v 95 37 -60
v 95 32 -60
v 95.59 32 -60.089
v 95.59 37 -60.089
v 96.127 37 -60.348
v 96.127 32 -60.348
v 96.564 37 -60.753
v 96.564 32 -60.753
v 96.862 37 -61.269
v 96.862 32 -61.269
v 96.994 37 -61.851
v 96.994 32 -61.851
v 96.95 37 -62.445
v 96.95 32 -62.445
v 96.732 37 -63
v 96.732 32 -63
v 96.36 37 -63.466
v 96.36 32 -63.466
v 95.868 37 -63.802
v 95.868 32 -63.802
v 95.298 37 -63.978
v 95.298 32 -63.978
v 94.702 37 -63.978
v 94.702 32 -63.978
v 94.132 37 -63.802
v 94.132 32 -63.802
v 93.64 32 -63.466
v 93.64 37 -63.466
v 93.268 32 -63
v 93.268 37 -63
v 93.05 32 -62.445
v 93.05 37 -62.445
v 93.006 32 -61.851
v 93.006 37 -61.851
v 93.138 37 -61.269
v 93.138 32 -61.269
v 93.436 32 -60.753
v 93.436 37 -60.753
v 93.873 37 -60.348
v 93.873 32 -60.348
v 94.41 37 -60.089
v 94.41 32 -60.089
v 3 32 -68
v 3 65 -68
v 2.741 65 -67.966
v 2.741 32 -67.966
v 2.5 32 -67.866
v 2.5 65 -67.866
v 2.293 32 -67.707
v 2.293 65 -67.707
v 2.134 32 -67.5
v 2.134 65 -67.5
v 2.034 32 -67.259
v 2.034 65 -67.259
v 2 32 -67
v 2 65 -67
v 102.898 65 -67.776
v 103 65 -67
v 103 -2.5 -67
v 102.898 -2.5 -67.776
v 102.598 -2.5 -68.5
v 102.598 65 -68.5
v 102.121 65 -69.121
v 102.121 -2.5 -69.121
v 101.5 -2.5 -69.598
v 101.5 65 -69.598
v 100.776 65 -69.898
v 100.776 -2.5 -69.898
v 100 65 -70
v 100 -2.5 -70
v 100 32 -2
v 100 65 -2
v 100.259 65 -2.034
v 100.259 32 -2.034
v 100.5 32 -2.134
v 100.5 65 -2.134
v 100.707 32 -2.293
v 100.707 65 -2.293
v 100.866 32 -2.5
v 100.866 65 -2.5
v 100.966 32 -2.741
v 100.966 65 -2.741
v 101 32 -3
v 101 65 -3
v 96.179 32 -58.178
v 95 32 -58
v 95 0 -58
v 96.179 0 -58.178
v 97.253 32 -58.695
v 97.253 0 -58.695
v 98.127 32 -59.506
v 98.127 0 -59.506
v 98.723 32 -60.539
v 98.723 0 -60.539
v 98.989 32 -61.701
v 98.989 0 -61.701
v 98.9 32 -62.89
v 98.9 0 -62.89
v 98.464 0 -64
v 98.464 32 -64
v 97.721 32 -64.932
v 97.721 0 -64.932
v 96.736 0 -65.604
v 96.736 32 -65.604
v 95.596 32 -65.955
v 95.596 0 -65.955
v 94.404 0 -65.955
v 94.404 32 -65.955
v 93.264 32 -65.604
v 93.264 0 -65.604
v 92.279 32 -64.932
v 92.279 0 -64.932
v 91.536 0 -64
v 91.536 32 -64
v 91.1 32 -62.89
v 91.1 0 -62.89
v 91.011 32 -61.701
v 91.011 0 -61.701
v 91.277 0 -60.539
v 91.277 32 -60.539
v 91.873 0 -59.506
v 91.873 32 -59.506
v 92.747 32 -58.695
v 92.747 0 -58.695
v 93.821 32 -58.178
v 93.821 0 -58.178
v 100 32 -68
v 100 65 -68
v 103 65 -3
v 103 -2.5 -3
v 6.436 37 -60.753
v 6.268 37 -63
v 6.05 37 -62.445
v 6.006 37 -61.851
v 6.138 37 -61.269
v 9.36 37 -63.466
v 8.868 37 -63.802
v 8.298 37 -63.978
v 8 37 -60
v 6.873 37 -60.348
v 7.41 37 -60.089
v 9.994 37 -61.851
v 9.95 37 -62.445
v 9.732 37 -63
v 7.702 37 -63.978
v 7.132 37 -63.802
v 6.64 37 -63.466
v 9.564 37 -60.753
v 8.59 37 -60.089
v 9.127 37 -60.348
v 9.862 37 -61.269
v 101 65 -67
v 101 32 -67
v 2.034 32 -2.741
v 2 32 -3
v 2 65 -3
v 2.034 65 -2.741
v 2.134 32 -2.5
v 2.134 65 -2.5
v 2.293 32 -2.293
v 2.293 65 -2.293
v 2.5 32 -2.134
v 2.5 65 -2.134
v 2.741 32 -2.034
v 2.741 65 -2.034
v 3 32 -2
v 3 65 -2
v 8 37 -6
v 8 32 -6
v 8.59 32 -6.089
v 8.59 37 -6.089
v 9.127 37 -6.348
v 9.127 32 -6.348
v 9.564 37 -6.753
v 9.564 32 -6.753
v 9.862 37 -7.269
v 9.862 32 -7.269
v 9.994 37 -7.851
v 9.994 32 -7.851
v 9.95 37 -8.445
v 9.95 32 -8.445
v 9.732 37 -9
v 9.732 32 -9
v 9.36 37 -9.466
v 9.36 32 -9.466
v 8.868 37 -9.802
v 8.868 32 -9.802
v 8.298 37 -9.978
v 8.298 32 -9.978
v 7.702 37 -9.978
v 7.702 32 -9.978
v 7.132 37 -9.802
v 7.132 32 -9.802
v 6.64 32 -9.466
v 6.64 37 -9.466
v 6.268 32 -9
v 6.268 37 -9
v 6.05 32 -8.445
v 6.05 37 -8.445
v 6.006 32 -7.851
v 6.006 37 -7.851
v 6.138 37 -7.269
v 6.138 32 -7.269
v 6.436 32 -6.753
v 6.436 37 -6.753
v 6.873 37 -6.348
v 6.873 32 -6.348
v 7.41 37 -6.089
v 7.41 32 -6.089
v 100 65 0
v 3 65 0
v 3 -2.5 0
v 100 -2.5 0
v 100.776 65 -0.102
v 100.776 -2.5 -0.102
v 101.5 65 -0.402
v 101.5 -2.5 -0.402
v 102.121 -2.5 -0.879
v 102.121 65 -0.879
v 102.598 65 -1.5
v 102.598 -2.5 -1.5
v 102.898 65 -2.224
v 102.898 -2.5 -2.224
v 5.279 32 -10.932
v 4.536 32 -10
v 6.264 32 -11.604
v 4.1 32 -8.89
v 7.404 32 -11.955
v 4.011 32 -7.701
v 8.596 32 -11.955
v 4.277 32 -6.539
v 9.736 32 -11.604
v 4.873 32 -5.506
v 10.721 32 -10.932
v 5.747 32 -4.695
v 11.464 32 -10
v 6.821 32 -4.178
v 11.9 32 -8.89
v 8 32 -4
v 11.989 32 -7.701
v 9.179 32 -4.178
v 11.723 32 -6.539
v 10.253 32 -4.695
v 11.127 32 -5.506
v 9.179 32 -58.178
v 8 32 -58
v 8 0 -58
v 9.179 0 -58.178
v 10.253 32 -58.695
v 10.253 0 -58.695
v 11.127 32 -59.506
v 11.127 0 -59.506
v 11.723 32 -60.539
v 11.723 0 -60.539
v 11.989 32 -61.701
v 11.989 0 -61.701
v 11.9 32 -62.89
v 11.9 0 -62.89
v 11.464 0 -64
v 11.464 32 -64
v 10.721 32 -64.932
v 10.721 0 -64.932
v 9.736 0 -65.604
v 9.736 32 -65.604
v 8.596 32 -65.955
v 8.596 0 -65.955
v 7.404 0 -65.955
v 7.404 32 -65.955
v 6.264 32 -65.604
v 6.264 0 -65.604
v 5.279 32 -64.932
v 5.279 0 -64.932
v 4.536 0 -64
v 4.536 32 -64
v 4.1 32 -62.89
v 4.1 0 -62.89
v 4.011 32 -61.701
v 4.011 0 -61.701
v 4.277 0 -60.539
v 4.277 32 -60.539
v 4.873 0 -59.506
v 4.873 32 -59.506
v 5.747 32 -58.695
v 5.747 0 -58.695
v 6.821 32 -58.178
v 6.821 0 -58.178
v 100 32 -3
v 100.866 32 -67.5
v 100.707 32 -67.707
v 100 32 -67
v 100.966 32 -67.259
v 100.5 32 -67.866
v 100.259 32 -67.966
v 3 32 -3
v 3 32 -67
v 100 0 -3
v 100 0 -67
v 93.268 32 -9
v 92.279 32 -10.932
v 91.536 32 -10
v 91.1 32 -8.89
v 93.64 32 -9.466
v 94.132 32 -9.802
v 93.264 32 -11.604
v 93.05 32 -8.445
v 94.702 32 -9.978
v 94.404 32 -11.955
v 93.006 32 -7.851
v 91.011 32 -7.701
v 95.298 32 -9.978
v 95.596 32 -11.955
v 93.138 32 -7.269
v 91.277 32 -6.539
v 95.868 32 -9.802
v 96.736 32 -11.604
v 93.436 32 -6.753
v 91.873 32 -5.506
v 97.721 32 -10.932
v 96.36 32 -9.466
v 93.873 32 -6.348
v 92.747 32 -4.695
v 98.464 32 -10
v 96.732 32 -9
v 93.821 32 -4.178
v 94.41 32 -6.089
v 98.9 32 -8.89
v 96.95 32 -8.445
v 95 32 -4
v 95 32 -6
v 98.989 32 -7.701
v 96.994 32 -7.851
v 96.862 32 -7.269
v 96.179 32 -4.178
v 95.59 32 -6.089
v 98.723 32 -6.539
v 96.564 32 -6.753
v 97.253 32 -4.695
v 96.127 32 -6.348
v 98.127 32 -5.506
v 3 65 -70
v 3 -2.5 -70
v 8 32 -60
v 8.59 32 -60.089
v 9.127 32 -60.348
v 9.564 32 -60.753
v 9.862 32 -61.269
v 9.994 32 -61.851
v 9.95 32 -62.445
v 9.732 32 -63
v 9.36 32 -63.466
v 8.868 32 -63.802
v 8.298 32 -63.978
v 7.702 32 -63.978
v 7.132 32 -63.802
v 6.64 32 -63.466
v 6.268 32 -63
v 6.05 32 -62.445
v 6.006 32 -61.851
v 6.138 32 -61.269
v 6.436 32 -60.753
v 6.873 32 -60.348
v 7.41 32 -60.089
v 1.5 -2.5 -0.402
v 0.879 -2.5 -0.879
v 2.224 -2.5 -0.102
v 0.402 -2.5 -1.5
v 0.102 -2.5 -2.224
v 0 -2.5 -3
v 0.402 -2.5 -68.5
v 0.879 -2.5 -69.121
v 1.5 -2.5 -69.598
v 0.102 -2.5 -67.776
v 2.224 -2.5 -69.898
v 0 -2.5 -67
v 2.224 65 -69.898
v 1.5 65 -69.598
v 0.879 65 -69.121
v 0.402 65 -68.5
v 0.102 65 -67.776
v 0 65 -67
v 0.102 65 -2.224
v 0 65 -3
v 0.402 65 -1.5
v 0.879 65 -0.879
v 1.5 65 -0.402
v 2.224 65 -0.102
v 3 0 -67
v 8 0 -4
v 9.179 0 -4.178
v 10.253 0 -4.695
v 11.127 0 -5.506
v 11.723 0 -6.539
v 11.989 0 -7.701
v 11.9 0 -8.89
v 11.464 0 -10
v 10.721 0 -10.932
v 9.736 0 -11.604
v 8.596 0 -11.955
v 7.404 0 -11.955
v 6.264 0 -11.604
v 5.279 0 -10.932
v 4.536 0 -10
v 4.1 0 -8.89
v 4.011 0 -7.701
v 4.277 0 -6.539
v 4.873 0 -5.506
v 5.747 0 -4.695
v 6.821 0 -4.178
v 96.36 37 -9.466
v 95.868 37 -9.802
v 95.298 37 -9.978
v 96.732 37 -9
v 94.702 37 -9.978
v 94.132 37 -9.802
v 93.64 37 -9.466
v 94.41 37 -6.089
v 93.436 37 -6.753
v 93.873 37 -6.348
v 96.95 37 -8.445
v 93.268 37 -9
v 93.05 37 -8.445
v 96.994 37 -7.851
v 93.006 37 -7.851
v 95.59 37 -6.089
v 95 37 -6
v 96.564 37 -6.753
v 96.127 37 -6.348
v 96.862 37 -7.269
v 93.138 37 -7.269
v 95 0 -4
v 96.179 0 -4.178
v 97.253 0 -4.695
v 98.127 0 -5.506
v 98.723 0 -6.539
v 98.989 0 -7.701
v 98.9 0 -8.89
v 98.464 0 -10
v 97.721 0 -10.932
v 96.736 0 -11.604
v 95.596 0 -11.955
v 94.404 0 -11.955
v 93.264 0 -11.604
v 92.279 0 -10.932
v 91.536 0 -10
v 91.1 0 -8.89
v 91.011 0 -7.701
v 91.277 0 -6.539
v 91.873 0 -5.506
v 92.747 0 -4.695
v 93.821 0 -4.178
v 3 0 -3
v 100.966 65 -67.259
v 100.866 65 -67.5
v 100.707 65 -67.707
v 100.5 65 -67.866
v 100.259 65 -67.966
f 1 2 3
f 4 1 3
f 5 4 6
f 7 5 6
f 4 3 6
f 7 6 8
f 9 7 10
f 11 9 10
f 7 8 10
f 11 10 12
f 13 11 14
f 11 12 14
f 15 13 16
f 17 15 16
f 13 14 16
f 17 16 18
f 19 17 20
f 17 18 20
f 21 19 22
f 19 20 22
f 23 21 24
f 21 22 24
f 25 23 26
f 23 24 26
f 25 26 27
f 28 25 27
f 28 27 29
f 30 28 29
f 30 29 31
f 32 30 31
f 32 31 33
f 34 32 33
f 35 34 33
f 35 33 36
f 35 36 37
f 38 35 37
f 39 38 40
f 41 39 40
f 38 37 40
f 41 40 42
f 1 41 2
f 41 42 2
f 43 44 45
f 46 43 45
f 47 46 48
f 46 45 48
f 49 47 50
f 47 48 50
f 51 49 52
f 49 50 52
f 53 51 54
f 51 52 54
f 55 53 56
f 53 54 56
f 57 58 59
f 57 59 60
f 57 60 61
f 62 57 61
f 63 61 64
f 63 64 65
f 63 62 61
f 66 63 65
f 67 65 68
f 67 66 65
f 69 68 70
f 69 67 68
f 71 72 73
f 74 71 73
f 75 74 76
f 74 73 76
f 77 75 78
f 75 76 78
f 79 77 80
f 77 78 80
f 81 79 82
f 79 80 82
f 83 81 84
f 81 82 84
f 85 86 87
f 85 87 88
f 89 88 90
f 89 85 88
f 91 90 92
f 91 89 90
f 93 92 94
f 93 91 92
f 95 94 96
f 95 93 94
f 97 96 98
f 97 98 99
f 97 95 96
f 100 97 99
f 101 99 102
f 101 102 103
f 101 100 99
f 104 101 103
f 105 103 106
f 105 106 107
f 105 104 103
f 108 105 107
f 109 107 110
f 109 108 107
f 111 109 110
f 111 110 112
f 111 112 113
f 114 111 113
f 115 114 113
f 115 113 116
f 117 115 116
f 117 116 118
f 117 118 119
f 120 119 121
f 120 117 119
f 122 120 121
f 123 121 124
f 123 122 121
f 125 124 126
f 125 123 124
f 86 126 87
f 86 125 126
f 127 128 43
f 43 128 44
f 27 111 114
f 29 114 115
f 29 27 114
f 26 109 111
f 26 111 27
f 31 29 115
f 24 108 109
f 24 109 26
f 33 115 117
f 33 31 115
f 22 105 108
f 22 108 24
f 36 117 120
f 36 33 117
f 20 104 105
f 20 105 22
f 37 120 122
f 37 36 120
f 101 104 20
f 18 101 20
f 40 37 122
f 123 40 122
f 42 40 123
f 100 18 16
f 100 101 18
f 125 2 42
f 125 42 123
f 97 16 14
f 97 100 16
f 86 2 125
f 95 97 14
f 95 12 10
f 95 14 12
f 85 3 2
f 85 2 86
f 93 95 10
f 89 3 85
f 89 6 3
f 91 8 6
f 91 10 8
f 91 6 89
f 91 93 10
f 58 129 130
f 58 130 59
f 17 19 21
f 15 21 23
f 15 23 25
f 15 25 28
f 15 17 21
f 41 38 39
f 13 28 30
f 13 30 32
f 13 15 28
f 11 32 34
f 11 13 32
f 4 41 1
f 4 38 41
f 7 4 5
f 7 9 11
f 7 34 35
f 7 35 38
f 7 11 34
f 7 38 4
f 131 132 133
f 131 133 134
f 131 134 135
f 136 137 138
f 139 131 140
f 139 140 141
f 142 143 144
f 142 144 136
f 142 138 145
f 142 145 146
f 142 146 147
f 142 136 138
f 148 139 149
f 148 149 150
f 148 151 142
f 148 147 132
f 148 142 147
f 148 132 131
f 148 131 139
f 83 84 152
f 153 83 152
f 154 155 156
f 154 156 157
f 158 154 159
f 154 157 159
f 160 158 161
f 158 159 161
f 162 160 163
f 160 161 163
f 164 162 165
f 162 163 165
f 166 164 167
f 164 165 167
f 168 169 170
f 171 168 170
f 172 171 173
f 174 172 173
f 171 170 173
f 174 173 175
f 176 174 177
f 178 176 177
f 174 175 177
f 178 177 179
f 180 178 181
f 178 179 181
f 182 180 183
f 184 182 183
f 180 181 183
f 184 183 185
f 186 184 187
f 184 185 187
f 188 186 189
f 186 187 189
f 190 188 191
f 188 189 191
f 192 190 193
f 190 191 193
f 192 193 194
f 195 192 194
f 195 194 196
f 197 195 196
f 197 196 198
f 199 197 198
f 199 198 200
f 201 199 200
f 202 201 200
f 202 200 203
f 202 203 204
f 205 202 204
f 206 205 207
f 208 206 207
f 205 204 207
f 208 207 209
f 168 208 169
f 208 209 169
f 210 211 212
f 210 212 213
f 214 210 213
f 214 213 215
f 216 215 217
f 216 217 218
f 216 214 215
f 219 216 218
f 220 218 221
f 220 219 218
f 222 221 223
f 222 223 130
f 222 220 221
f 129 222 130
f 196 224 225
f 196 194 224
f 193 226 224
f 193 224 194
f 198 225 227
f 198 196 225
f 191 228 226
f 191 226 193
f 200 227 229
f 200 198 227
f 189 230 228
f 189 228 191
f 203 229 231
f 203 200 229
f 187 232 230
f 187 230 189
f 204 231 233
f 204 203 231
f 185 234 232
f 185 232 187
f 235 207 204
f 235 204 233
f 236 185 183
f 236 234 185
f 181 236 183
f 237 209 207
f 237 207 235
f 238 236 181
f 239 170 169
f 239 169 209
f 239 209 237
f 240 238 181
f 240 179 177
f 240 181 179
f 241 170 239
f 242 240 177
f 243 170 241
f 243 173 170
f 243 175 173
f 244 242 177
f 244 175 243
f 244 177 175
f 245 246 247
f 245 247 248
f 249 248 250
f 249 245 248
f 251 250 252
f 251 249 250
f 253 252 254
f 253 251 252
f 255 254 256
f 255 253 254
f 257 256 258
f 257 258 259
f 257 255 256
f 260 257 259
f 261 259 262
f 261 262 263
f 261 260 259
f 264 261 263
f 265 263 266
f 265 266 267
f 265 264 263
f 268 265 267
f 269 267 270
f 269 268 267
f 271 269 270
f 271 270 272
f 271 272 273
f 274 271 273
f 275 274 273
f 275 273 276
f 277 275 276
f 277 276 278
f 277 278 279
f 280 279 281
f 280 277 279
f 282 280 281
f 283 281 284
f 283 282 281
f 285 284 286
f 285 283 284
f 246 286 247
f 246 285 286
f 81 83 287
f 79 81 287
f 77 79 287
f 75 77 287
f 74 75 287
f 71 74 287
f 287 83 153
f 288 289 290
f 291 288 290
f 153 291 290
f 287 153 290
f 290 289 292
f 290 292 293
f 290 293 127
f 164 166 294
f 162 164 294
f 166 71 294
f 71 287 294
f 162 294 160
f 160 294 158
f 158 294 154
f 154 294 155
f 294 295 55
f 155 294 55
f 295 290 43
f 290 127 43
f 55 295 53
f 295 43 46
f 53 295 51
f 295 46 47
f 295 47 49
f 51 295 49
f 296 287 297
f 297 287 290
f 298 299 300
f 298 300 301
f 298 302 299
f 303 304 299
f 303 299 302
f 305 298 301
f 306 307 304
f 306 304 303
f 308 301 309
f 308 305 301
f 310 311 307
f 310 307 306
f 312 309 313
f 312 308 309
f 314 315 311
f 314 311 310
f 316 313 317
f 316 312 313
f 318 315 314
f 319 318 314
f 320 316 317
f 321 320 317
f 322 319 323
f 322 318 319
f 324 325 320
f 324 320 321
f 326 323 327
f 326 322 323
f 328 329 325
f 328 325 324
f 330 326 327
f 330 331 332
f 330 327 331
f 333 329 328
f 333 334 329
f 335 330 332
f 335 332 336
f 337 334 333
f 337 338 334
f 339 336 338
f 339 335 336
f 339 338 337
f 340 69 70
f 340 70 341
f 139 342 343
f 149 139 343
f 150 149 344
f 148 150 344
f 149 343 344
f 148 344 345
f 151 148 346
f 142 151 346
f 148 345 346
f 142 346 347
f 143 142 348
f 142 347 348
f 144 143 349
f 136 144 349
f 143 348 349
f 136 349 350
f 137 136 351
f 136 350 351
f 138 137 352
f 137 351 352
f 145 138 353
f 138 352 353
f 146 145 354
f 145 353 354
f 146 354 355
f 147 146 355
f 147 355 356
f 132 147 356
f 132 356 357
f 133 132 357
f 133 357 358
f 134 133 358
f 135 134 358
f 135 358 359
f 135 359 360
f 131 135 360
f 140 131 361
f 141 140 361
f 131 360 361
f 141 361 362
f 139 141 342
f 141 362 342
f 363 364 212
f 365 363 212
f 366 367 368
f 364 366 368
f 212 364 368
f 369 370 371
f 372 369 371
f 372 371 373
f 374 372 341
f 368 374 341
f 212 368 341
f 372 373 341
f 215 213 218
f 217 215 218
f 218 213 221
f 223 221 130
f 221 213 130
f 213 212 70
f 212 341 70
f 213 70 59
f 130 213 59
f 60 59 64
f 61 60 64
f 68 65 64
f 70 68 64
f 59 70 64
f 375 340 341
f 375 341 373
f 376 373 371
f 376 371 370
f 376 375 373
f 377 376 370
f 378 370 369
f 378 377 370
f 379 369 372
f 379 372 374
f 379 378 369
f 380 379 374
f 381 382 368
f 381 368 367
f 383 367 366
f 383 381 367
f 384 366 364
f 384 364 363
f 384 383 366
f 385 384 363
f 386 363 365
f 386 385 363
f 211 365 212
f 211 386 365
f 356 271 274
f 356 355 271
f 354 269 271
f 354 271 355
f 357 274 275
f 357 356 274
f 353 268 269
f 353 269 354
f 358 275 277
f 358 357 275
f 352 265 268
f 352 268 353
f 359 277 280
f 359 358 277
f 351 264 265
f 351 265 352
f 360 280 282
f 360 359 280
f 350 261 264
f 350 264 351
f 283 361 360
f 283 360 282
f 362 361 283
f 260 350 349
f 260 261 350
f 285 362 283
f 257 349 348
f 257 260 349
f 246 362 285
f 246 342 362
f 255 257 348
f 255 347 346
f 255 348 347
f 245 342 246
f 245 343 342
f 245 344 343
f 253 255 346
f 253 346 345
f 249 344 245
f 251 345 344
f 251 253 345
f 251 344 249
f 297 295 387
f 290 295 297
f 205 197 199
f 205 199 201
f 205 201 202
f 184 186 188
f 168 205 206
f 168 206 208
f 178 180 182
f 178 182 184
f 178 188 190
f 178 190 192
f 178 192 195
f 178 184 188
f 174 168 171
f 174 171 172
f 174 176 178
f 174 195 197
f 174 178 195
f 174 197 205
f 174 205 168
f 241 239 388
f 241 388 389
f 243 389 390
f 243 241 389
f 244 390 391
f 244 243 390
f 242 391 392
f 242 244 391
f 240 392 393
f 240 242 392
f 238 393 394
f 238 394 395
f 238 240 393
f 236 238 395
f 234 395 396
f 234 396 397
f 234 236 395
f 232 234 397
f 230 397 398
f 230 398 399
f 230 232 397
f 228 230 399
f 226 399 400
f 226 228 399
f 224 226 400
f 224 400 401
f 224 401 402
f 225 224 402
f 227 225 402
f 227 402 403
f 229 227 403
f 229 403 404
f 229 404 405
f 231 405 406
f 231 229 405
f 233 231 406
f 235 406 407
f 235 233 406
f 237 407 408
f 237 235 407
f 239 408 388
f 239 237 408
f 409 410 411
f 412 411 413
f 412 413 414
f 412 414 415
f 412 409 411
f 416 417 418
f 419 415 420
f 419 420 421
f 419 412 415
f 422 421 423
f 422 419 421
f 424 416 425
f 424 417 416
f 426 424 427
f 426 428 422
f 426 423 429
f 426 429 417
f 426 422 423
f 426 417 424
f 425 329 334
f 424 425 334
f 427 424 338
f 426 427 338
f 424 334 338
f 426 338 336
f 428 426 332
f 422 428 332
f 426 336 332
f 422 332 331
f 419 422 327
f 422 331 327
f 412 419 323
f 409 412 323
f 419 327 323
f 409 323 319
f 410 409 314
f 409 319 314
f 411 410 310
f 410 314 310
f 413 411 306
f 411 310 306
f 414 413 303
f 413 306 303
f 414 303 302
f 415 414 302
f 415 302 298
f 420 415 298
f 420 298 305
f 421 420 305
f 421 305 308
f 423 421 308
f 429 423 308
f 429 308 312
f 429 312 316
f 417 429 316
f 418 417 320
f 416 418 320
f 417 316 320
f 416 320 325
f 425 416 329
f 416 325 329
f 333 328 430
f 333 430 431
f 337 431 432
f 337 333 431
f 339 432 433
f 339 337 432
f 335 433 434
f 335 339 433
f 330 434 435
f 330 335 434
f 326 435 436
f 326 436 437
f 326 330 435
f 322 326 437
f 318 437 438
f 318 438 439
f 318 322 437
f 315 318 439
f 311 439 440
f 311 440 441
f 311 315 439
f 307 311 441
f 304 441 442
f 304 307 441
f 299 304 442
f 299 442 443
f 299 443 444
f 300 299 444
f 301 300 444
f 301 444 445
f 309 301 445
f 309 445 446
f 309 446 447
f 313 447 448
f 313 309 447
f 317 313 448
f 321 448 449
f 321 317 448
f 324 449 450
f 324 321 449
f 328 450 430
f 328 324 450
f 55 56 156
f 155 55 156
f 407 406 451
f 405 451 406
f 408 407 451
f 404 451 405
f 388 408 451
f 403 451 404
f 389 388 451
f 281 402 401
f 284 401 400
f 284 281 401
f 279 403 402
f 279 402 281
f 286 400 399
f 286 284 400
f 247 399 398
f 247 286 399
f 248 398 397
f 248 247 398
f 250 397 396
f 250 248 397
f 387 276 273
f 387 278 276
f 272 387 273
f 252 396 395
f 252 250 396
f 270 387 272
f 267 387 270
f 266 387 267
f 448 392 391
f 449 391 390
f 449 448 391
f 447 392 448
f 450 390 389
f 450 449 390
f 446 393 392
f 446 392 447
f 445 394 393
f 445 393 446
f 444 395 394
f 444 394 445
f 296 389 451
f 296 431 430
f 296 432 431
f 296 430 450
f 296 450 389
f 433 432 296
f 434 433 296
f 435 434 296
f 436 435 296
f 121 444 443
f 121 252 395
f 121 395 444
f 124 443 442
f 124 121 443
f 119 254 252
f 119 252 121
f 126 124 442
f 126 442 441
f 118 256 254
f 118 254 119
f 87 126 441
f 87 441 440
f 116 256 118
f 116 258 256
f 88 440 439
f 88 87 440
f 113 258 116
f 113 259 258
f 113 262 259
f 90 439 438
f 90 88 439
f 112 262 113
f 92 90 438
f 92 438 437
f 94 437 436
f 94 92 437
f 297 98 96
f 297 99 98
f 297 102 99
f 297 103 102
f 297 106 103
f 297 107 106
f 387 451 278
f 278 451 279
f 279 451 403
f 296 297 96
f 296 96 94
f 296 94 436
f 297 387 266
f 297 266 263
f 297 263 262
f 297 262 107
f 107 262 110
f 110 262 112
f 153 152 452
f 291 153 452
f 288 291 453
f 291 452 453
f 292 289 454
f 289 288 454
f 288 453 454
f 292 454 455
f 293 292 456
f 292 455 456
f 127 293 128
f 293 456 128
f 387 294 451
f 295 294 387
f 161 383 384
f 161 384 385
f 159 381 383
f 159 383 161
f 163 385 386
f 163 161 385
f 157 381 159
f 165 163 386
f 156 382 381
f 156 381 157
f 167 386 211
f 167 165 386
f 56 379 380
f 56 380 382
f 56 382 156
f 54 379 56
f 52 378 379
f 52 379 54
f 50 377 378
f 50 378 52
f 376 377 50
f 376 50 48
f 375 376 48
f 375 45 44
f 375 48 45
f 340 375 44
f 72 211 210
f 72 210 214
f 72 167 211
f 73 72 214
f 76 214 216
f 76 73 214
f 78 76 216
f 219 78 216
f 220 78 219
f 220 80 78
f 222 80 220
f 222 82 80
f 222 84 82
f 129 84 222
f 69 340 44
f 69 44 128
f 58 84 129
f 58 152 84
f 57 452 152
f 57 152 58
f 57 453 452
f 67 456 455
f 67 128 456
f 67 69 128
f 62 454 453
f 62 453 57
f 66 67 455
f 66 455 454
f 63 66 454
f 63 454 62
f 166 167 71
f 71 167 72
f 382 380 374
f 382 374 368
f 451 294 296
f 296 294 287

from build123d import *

# Parameters (mm, degrees)
BOSS_EXTRUDE4_DEPTH  = 2.5
BOSS_EXTRUDE5_START  = 65
BOSS_EXTRUDE5_DEPTH  = 65
BOSS_EXTRUDE6_START  = 32
SKETCH1_9_W          = 97
SKETCH1_9_H          = 64
SKETCH1_9_R          = 4
BOSS_EXTRUDE6_DEPTH  = 32
SKETCH3_R            = 2
BOSS_EXTRUDE7_DEPTH  = 5
SKETCH6_R            = 2
BOSS_EXTRUDE8_DEPTH  = 5
SKETCH5_R            = 2
BOSS_EXTRUDE9_DEPTH  = 5
SKETCH4_R            = 2
BOSS_EXTRUDE10_DEPTH = 5


with BuildPart() as part:
    # Sketch1 → Boss-Extrude4 (new body)
    with BuildSketch(Plane(origin=(0, 0, 0), x_dir=(1, 0, 0), z_dir=(0, 1, 0))):
        with BuildLine():
            ThreePointArc((0, 3), (0.878679656, 0.878679656), (3, 0))
            Line((3, 0), (100, 0))
            ThreePointArc((100, 0), (102.121320344, 0.878679656), (103, 3))
            Line((103, 3), (103, 67))
            ThreePointArc((103, 67), (102.121320344, 69.121320344), (100, 70))
            Line((100, 70), (3, 70))
            ThreePointArc((3, 70), (0.878679656, 69.121320344), (0, 67))
            Line((0, 67), (0, 3))
        make_face()
    extrude(amount=-BOSS_EXTRUDE4_DEPTH)

    # Sketch1<8> → Boss-Extrude5 (add)
    with BuildSketch(Plane(origin=(0, 0, 0), x_dir=(1, 0, 0), z_dir=(0, 1, 0)).offset(BOSS_EXTRUDE5_START)):
        with BuildLine():
            ThreePointArc((0, 3), (0.878679656, 0.878679656), (3, 0))
            Line((3, 0), (100, 0))
            ThreePointArc((100, 0), (102.121320344, 0.878679656), (103, 3))
            Line((103, 3), (103, 67))
            ThreePointArc((103, 67), (102.121320344, 69.121320344), (100, 70))
            Line((100, 70), (3, 70))
            ThreePointArc((3, 70), (0.878679656, 69.121320344), (0, 67))
            Line((0, 67), (0, 3))
        make_face()
        with BuildLine():
            Line((100, 2), (3, 2))
            ThreePointArc((3, 2), (2.292893219, 2.292893219), (2, 3))
            Line((2, 3), (2, 67))
            ThreePointArc((2, 67), (2.292893219, 67.707106781), (3, 68))
            Line((3, 68), (100, 68))
            ThreePointArc((100, 68), (100.707106781, 67.707106781), (101, 67))
            Line((101, 67), (101, 3))
            ThreePointArc((101, 3), (100.707106781, 2.292893219), (100, 2))
        make_face(mode=Mode.SUBTRACT)
    extrude(amount=-BOSS_EXTRUDE5_DEPTH)

    # Sketch1<9> → Boss-Extrude6 (add)
    # profile 1 of 5: a face of its own
    with BuildSketch(Plane(origin=(0, 0, 0), x_dir=(1, 0, 0), z_dir=(0, 1, 0)).offset(BOSS_EXTRUDE6_START)):
        with BuildLine():
            ThreePointArc((2, 3), (2.292893219, 2.292893219), (3, 2))
            Line((3, 2), (100, 2))
            ThreePointArc((100, 2), (100.707106781, 2.292893219), (101, 3))
            Line((101, 3), (101, 67))
            ThreePointArc((101, 67), (100.707106781, 67.707106781), (100, 68))
            Line((100, 68), (3, 68))
            ThreePointArc((3, 68), (2.292893219, 67.707106781), (2, 67))
            Line((2, 67), (2, 3))
        make_face()
        with Locations((51.5, 35)):
            Rectangle(SKETCH1_9_W, SKETCH1_9_H, mode=Mode.SUBTRACT)
    # profile 2 of 5: a face of its own
    with BuildSketch(Plane(origin=(0, 0, 0), x_dir=(1, 0, 0), z_dir=(0, 1, 0)).offset(BOSS_EXTRUDE6_START)):
        with Locations((95, 8)):
            Circle(SKETCH1_9_R)
    # profile 3 of 5: a face of its own
    with BuildSketch(Plane(origin=(0, 0, 0), x_dir=(1, 0, 0), z_dir=(0, 1, 0)).offset(BOSS_EXTRUDE6_START)):
        with Locations((95, 62)):
            Circle(SKETCH1_9_R)
    # profile 4 of 5: a face of its own
    with BuildSketch(Plane(origin=(0, 0, 0), x_dir=(1, 0, 0), z_dir=(0, 1, 0)).offset(BOSS_EXTRUDE6_START)):
        with Locations((8, 8)):
            Circle(SKETCH1_9_R)
    # profile 5 of 5: a face of its own
    with BuildSketch(Plane(origin=(0, 0, 0), x_dir=(1, 0, 0), z_dir=(0, 1, 0)).offset(BOSS_EXTRUDE6_START)):
        with Locations((8, 62)):
            Circle(SKETCH1_9_R)
    extrude(amount=-BOSS_EXTRUDE6_DEPTH)

    # Sketch3 → Boss-Extrude7 (add)
    with BuildSketch(Plane(origin=(0, 32, 0), x_dir=(1, 0, 0), z_dir=(0, 1, 0))):
        with Locations((8, 62)):
            Circle(SKETCH3_R)
    extrude(amount=BOSS_EXTRUDE7_DEPTH)

    # Sketch6 → Boss-Extrude8 (add)
    with BuildSketch(Plane(origin=(0, 32, 0), x_dir=(1, 0, 0), z_dir=(0, 1, 0))):
        with Locations((95, 62)):
            Circle(SKETCH6_R)
    extrude(amount=BOSS_EXTRUDE8_DEPTH)

    # Sketch5 → Boss-Extrude9 (add)
    with BuildSketch(Plane(origin=(0, 32, 0), x_dir=(1, 0, 0), z_dir=(0, 1, 0))):
        with Locations((95, 8)):
            Circle(SKETCH5_R)
    extrude(amount=BOSS_EXTRUDE9_DEPTH)

    # Sketch4 → Boss-Extrude10 (add)
    with BuildSketch(Plane(origin=(0, 32, 0), x_dir=(1, 0, 0), z_dir=(0, 1, 0))):
        with Locations((8, 8)):
            Circle(SKETCH4_R)
    extrude(amount=BOSS_EXTRUDE10_DEPTH)


solid = part.part
